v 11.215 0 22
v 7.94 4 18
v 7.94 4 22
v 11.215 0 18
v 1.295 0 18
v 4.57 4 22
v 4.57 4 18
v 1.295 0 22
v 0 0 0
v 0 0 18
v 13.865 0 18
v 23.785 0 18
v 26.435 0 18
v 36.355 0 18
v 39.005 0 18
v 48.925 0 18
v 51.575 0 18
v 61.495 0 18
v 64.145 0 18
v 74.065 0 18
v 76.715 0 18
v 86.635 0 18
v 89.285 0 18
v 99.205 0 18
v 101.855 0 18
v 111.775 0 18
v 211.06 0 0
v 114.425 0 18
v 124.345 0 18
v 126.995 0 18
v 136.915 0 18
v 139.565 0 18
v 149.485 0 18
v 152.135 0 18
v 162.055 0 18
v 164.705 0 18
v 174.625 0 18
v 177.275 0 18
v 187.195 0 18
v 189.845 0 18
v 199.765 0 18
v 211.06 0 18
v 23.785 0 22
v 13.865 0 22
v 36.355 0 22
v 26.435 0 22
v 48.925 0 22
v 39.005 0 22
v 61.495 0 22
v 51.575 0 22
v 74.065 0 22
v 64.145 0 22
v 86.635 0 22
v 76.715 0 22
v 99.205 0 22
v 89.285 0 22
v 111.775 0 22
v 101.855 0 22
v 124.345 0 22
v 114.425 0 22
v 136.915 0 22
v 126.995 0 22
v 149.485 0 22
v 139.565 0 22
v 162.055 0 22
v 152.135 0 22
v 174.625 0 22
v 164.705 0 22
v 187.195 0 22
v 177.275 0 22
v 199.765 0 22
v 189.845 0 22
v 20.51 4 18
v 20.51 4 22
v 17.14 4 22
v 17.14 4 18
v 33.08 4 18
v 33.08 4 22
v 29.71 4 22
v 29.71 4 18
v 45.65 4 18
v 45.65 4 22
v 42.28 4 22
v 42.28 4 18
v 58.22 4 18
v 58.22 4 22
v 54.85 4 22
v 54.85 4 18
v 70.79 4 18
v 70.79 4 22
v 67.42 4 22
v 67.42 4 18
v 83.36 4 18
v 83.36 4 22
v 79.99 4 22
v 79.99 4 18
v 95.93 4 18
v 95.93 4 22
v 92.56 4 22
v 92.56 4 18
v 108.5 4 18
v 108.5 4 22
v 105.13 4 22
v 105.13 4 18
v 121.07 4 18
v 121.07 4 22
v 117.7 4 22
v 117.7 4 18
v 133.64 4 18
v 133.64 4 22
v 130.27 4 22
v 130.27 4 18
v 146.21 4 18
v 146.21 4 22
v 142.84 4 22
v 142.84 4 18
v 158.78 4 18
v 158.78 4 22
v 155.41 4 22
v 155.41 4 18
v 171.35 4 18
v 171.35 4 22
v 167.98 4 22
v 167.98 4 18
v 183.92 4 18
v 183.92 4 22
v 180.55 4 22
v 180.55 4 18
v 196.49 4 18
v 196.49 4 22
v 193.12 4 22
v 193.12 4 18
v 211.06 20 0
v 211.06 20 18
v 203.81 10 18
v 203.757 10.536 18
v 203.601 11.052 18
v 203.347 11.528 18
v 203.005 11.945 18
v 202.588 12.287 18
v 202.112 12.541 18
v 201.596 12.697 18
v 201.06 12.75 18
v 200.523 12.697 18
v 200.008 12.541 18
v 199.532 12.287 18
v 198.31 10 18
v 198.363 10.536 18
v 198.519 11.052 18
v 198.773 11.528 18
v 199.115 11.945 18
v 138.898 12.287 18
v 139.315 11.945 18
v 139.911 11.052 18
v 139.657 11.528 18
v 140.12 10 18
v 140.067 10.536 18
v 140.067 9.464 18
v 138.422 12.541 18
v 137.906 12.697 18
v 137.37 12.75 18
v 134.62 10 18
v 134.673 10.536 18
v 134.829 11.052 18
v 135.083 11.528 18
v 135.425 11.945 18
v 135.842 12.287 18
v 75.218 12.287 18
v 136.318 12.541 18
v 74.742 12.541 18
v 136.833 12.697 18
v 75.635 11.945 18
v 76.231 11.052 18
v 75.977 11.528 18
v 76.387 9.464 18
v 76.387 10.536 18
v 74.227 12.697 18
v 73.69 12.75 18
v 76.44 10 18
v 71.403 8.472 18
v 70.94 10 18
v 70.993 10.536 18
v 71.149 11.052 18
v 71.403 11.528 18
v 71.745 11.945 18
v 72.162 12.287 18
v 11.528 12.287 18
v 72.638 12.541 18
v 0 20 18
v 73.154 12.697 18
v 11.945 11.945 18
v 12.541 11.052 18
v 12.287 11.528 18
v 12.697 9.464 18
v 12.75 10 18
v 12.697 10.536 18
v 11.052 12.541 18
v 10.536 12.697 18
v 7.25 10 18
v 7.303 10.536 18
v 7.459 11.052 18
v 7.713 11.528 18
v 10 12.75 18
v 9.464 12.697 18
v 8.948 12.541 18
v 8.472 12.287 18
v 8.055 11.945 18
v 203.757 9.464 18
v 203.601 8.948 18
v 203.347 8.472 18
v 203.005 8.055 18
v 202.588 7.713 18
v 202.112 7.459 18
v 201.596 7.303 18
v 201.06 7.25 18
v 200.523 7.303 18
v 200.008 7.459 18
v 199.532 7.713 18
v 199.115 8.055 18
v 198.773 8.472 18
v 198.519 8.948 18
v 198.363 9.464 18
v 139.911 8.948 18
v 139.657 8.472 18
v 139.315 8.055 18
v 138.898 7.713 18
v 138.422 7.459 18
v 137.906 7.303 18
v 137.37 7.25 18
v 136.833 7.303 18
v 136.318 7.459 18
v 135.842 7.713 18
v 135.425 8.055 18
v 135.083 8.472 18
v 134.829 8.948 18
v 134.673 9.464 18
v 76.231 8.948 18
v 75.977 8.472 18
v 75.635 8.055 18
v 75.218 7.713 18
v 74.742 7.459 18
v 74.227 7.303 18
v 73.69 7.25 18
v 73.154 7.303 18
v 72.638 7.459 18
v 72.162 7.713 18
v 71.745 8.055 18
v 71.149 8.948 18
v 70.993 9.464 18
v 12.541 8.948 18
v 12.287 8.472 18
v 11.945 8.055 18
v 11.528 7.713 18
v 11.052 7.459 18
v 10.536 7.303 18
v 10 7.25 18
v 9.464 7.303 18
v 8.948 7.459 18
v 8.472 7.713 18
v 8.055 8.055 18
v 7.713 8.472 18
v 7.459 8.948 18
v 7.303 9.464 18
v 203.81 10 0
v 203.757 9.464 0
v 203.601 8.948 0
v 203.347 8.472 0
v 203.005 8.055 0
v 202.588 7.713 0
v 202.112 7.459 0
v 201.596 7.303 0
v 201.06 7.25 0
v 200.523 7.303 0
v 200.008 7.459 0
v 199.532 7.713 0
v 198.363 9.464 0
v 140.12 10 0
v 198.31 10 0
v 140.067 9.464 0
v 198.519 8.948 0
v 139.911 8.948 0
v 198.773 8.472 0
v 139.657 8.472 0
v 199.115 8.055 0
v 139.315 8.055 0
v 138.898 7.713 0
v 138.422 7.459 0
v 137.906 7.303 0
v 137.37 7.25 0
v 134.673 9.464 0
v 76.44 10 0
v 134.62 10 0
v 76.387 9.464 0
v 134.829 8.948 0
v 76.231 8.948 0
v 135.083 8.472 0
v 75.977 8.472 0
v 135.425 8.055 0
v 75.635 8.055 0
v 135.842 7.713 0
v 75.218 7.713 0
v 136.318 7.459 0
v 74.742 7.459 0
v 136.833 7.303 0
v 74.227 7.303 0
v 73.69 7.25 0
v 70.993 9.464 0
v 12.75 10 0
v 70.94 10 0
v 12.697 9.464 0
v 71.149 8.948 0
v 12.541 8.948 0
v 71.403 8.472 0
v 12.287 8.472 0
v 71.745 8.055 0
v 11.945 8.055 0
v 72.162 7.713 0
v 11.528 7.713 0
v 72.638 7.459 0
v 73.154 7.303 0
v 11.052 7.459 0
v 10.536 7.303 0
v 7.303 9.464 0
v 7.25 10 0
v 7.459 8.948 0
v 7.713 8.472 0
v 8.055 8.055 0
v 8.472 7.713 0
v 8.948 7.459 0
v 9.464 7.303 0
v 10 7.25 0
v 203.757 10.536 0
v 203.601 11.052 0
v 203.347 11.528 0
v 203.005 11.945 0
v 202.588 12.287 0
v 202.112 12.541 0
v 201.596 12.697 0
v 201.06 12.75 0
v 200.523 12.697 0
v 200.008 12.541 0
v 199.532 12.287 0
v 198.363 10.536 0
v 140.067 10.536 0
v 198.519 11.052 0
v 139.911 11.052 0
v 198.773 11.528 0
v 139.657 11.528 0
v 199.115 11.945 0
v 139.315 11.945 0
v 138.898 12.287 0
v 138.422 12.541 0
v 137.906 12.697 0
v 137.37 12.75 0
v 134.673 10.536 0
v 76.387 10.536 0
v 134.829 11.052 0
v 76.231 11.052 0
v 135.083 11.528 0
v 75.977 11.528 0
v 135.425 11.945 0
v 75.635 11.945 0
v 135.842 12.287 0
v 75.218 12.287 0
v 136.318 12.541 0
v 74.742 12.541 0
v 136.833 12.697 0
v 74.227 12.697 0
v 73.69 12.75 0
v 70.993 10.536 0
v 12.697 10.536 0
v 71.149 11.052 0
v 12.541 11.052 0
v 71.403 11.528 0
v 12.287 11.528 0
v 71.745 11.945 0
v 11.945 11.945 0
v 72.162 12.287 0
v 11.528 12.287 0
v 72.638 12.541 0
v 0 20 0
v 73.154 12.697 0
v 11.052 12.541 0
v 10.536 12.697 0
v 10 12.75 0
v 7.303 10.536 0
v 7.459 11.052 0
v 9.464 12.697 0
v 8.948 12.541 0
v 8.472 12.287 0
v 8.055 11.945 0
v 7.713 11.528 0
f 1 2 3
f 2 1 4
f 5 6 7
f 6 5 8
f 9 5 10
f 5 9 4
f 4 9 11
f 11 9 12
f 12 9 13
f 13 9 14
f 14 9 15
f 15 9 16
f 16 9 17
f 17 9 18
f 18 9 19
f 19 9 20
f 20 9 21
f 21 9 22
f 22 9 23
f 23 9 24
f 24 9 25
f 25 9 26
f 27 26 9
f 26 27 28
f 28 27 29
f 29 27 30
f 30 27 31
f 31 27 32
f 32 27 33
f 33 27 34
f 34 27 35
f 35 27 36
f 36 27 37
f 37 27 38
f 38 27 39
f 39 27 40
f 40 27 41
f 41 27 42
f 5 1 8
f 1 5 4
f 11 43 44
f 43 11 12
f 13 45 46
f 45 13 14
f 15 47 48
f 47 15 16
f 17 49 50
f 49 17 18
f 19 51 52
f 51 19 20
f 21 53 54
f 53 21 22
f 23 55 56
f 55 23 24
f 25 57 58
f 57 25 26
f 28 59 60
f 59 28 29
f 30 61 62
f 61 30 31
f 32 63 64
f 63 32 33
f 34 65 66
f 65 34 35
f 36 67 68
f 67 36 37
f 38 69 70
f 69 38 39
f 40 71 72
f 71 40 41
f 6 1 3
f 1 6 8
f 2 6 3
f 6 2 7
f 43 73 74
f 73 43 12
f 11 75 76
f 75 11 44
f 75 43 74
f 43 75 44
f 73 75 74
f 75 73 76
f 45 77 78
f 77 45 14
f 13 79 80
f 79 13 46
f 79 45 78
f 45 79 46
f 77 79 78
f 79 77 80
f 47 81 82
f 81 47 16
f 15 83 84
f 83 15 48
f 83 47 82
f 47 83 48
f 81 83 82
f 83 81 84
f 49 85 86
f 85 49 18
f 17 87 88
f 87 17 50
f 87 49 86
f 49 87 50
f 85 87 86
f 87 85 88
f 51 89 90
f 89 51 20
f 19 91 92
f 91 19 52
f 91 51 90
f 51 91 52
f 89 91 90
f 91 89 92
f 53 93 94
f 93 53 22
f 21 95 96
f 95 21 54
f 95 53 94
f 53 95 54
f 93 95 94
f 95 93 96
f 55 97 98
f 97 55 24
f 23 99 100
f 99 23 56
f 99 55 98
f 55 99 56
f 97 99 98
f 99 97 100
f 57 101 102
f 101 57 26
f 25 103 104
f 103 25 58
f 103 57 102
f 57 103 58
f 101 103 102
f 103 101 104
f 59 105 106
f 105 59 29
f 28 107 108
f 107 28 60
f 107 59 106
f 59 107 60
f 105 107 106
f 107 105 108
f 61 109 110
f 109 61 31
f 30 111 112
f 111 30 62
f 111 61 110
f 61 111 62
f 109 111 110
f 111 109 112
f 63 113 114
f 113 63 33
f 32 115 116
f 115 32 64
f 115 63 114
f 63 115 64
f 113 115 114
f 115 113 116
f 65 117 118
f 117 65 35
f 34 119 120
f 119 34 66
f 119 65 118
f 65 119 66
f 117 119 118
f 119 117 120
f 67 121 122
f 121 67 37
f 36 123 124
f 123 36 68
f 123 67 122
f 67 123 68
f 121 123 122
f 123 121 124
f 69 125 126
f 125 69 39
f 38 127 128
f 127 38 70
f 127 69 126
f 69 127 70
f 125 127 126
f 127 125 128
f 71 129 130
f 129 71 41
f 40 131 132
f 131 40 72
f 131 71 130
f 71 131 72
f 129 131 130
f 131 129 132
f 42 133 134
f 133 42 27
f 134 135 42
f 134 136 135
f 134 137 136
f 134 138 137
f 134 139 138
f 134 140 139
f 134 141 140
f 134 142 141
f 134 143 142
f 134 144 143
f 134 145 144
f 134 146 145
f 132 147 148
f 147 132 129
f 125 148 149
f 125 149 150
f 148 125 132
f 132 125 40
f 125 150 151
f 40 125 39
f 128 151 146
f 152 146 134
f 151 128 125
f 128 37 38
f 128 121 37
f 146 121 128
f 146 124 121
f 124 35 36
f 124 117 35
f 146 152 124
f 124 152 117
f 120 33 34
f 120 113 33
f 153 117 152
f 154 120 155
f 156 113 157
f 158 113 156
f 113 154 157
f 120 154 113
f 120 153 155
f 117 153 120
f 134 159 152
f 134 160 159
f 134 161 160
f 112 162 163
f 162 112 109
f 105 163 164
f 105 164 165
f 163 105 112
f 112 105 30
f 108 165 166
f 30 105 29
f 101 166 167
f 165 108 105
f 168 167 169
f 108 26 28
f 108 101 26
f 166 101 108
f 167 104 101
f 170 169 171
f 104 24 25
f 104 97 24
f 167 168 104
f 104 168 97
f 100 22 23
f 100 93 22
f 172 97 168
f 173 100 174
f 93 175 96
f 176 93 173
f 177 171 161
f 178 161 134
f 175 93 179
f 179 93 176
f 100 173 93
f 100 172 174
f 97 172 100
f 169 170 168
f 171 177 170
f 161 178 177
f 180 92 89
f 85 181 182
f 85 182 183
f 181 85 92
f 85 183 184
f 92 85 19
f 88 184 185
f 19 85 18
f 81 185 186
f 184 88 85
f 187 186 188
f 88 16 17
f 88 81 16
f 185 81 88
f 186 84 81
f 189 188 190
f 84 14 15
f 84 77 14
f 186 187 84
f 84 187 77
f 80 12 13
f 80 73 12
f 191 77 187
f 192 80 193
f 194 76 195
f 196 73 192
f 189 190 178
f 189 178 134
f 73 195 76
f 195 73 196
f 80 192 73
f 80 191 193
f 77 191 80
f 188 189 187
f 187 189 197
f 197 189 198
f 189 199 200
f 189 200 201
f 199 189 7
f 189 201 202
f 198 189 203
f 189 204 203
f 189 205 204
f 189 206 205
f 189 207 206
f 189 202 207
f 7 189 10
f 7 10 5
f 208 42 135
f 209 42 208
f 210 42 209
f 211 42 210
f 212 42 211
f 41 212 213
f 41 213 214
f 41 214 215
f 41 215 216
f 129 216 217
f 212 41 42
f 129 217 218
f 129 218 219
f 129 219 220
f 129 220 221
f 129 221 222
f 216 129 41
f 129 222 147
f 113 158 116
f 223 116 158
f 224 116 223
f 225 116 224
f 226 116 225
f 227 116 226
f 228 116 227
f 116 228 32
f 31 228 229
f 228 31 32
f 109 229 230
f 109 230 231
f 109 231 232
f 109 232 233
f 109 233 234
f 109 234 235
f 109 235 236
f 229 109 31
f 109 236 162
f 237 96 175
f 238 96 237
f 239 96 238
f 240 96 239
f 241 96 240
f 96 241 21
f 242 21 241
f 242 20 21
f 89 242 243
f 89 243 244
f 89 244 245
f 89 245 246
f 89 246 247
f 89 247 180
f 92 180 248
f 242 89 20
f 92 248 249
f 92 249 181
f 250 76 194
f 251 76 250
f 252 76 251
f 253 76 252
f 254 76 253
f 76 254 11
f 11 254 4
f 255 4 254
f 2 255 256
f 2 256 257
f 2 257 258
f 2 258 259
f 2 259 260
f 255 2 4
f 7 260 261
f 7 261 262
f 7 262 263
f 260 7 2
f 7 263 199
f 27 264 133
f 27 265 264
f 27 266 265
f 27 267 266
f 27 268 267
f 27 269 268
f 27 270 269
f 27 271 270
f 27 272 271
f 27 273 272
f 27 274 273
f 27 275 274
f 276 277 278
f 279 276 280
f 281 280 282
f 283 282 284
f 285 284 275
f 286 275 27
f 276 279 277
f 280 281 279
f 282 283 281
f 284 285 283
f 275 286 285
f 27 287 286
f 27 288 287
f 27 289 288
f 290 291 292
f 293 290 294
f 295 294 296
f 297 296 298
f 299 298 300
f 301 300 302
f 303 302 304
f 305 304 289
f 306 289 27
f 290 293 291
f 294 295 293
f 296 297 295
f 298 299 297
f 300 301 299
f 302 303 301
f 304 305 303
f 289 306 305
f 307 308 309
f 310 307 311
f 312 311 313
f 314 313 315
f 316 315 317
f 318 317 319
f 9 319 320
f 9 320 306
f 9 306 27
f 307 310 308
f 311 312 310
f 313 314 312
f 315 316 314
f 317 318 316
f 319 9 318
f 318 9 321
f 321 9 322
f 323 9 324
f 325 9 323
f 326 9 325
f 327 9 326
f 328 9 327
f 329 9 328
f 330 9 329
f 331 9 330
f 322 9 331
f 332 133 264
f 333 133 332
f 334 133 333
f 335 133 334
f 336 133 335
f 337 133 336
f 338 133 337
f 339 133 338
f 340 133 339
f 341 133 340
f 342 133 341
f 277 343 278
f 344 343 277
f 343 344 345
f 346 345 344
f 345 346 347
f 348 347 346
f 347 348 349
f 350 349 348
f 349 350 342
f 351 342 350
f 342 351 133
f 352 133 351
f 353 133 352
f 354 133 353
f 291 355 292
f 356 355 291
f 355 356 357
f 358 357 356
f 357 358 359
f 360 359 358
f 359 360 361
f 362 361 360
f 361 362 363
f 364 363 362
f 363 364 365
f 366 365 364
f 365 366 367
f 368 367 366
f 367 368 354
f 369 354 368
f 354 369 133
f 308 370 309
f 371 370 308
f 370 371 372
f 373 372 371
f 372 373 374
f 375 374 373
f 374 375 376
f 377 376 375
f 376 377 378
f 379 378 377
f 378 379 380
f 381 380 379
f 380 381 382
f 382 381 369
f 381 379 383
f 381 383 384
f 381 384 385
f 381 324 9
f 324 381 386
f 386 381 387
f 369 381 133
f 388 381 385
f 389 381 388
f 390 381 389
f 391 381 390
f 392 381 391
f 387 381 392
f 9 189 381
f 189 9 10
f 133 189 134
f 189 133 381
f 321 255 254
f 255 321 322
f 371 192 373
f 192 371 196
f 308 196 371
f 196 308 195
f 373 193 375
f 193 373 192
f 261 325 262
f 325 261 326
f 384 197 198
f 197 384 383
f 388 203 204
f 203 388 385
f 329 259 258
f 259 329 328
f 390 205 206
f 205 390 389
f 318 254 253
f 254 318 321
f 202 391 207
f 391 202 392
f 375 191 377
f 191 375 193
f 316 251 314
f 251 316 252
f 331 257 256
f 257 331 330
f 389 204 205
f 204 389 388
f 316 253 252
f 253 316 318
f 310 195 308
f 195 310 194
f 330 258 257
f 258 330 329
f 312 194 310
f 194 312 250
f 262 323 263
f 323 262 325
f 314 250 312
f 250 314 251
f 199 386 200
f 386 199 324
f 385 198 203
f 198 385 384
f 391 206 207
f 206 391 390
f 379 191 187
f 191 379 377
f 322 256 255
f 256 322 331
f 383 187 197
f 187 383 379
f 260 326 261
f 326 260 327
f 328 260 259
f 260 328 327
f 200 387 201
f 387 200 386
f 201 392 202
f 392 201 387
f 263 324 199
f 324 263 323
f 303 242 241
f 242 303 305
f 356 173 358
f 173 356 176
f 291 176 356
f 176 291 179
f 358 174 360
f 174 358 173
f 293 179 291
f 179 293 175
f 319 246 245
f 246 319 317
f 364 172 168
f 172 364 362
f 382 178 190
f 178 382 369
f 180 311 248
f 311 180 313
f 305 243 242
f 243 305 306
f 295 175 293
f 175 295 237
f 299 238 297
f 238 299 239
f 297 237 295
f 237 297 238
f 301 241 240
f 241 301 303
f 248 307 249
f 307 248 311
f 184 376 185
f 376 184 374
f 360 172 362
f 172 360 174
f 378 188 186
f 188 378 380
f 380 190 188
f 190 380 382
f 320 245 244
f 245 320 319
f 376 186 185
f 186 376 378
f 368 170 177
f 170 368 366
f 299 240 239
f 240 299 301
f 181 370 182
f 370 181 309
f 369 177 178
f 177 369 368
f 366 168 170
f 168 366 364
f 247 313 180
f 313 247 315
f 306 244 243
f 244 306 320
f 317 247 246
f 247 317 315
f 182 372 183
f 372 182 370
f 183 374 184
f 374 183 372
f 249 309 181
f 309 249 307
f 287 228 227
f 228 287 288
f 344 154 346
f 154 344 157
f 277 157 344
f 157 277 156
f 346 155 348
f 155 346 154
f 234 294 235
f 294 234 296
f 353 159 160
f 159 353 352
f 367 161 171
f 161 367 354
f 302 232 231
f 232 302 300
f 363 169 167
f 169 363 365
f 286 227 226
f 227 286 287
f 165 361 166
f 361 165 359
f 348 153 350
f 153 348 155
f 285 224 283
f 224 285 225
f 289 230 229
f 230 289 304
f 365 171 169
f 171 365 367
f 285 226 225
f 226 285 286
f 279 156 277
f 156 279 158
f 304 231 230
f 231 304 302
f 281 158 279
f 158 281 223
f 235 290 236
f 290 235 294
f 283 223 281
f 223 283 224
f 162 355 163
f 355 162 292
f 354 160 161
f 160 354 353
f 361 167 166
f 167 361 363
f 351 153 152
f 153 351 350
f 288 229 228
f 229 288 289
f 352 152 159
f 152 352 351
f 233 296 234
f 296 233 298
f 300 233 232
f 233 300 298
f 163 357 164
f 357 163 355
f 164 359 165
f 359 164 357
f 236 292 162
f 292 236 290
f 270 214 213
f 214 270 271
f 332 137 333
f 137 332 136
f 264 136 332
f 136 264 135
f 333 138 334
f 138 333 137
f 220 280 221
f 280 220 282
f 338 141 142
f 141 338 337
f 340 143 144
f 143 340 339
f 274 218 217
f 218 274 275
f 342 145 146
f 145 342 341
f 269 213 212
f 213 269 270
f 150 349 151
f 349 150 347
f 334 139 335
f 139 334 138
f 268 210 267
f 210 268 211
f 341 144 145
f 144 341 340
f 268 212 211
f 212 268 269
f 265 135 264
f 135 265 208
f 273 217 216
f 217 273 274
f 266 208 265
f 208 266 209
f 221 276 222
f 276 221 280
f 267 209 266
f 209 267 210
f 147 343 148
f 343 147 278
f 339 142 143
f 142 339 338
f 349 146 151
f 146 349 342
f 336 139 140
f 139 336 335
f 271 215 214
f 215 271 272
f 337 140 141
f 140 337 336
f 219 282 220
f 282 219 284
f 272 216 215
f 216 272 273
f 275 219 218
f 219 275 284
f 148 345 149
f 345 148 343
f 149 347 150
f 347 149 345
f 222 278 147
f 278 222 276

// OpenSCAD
$fn = 32;

// ----------------------------------------------------------------------
// Gear rack: m=4 z=16, 211.06 x 20 x 22 mm
// ----------------------------------------------------------------------

// --- parameters (mm) ---
length = 211.06;          // rack length, X
width = 20;               // rack width, Y
height = 22;              // overall height, Z
module_m = 4;             // module
back_t = 18;              // tooth root line height
pitch = 12.57;            // circular pitch
tip_w = 3.37;             // tooth thickness at the tip
root_w = 9.92;            // tooth thickness at the root line
hole_d = 5.5;             // mounting hole
sink = 0.6;               // tooth root overlap into the body

tooth_span = 201.06;

module tooth(x0) {
  /* 20 deg flank profile, sunk into the body for a positive overlap */
  translate([x0, 0, back_t - sink])
    linear_extrude(height = height - back_t + sink)
      polygon(points = [[-root_w / 2, 0], [root_w / 2, 0],
                        [tip_w / 2, height - back_t],
                        [-tip_w / 2, height - back_t]]);
}

difference() {
  union() {
    cube([length, width, back_t]);
    for (i = [0 : 16 - 1])
      tooth((i + 0.5) * pitch + (tooth_span - 16 * pitch) / 2);
  }
  translate([10, 10, -1]) cylinder(h = back_t + 2, d = hole_d);
  translate([73.69, 10, -1]) cylinder(h = back_t + 2, d = hole_d);
  translate([137.37, 10, -1]) cylinder(h = back_t + 2, d = hole_d);
  translate([201.06, 10, -1]) cylinder(h = back_t + 2, d = hole_d);
}
